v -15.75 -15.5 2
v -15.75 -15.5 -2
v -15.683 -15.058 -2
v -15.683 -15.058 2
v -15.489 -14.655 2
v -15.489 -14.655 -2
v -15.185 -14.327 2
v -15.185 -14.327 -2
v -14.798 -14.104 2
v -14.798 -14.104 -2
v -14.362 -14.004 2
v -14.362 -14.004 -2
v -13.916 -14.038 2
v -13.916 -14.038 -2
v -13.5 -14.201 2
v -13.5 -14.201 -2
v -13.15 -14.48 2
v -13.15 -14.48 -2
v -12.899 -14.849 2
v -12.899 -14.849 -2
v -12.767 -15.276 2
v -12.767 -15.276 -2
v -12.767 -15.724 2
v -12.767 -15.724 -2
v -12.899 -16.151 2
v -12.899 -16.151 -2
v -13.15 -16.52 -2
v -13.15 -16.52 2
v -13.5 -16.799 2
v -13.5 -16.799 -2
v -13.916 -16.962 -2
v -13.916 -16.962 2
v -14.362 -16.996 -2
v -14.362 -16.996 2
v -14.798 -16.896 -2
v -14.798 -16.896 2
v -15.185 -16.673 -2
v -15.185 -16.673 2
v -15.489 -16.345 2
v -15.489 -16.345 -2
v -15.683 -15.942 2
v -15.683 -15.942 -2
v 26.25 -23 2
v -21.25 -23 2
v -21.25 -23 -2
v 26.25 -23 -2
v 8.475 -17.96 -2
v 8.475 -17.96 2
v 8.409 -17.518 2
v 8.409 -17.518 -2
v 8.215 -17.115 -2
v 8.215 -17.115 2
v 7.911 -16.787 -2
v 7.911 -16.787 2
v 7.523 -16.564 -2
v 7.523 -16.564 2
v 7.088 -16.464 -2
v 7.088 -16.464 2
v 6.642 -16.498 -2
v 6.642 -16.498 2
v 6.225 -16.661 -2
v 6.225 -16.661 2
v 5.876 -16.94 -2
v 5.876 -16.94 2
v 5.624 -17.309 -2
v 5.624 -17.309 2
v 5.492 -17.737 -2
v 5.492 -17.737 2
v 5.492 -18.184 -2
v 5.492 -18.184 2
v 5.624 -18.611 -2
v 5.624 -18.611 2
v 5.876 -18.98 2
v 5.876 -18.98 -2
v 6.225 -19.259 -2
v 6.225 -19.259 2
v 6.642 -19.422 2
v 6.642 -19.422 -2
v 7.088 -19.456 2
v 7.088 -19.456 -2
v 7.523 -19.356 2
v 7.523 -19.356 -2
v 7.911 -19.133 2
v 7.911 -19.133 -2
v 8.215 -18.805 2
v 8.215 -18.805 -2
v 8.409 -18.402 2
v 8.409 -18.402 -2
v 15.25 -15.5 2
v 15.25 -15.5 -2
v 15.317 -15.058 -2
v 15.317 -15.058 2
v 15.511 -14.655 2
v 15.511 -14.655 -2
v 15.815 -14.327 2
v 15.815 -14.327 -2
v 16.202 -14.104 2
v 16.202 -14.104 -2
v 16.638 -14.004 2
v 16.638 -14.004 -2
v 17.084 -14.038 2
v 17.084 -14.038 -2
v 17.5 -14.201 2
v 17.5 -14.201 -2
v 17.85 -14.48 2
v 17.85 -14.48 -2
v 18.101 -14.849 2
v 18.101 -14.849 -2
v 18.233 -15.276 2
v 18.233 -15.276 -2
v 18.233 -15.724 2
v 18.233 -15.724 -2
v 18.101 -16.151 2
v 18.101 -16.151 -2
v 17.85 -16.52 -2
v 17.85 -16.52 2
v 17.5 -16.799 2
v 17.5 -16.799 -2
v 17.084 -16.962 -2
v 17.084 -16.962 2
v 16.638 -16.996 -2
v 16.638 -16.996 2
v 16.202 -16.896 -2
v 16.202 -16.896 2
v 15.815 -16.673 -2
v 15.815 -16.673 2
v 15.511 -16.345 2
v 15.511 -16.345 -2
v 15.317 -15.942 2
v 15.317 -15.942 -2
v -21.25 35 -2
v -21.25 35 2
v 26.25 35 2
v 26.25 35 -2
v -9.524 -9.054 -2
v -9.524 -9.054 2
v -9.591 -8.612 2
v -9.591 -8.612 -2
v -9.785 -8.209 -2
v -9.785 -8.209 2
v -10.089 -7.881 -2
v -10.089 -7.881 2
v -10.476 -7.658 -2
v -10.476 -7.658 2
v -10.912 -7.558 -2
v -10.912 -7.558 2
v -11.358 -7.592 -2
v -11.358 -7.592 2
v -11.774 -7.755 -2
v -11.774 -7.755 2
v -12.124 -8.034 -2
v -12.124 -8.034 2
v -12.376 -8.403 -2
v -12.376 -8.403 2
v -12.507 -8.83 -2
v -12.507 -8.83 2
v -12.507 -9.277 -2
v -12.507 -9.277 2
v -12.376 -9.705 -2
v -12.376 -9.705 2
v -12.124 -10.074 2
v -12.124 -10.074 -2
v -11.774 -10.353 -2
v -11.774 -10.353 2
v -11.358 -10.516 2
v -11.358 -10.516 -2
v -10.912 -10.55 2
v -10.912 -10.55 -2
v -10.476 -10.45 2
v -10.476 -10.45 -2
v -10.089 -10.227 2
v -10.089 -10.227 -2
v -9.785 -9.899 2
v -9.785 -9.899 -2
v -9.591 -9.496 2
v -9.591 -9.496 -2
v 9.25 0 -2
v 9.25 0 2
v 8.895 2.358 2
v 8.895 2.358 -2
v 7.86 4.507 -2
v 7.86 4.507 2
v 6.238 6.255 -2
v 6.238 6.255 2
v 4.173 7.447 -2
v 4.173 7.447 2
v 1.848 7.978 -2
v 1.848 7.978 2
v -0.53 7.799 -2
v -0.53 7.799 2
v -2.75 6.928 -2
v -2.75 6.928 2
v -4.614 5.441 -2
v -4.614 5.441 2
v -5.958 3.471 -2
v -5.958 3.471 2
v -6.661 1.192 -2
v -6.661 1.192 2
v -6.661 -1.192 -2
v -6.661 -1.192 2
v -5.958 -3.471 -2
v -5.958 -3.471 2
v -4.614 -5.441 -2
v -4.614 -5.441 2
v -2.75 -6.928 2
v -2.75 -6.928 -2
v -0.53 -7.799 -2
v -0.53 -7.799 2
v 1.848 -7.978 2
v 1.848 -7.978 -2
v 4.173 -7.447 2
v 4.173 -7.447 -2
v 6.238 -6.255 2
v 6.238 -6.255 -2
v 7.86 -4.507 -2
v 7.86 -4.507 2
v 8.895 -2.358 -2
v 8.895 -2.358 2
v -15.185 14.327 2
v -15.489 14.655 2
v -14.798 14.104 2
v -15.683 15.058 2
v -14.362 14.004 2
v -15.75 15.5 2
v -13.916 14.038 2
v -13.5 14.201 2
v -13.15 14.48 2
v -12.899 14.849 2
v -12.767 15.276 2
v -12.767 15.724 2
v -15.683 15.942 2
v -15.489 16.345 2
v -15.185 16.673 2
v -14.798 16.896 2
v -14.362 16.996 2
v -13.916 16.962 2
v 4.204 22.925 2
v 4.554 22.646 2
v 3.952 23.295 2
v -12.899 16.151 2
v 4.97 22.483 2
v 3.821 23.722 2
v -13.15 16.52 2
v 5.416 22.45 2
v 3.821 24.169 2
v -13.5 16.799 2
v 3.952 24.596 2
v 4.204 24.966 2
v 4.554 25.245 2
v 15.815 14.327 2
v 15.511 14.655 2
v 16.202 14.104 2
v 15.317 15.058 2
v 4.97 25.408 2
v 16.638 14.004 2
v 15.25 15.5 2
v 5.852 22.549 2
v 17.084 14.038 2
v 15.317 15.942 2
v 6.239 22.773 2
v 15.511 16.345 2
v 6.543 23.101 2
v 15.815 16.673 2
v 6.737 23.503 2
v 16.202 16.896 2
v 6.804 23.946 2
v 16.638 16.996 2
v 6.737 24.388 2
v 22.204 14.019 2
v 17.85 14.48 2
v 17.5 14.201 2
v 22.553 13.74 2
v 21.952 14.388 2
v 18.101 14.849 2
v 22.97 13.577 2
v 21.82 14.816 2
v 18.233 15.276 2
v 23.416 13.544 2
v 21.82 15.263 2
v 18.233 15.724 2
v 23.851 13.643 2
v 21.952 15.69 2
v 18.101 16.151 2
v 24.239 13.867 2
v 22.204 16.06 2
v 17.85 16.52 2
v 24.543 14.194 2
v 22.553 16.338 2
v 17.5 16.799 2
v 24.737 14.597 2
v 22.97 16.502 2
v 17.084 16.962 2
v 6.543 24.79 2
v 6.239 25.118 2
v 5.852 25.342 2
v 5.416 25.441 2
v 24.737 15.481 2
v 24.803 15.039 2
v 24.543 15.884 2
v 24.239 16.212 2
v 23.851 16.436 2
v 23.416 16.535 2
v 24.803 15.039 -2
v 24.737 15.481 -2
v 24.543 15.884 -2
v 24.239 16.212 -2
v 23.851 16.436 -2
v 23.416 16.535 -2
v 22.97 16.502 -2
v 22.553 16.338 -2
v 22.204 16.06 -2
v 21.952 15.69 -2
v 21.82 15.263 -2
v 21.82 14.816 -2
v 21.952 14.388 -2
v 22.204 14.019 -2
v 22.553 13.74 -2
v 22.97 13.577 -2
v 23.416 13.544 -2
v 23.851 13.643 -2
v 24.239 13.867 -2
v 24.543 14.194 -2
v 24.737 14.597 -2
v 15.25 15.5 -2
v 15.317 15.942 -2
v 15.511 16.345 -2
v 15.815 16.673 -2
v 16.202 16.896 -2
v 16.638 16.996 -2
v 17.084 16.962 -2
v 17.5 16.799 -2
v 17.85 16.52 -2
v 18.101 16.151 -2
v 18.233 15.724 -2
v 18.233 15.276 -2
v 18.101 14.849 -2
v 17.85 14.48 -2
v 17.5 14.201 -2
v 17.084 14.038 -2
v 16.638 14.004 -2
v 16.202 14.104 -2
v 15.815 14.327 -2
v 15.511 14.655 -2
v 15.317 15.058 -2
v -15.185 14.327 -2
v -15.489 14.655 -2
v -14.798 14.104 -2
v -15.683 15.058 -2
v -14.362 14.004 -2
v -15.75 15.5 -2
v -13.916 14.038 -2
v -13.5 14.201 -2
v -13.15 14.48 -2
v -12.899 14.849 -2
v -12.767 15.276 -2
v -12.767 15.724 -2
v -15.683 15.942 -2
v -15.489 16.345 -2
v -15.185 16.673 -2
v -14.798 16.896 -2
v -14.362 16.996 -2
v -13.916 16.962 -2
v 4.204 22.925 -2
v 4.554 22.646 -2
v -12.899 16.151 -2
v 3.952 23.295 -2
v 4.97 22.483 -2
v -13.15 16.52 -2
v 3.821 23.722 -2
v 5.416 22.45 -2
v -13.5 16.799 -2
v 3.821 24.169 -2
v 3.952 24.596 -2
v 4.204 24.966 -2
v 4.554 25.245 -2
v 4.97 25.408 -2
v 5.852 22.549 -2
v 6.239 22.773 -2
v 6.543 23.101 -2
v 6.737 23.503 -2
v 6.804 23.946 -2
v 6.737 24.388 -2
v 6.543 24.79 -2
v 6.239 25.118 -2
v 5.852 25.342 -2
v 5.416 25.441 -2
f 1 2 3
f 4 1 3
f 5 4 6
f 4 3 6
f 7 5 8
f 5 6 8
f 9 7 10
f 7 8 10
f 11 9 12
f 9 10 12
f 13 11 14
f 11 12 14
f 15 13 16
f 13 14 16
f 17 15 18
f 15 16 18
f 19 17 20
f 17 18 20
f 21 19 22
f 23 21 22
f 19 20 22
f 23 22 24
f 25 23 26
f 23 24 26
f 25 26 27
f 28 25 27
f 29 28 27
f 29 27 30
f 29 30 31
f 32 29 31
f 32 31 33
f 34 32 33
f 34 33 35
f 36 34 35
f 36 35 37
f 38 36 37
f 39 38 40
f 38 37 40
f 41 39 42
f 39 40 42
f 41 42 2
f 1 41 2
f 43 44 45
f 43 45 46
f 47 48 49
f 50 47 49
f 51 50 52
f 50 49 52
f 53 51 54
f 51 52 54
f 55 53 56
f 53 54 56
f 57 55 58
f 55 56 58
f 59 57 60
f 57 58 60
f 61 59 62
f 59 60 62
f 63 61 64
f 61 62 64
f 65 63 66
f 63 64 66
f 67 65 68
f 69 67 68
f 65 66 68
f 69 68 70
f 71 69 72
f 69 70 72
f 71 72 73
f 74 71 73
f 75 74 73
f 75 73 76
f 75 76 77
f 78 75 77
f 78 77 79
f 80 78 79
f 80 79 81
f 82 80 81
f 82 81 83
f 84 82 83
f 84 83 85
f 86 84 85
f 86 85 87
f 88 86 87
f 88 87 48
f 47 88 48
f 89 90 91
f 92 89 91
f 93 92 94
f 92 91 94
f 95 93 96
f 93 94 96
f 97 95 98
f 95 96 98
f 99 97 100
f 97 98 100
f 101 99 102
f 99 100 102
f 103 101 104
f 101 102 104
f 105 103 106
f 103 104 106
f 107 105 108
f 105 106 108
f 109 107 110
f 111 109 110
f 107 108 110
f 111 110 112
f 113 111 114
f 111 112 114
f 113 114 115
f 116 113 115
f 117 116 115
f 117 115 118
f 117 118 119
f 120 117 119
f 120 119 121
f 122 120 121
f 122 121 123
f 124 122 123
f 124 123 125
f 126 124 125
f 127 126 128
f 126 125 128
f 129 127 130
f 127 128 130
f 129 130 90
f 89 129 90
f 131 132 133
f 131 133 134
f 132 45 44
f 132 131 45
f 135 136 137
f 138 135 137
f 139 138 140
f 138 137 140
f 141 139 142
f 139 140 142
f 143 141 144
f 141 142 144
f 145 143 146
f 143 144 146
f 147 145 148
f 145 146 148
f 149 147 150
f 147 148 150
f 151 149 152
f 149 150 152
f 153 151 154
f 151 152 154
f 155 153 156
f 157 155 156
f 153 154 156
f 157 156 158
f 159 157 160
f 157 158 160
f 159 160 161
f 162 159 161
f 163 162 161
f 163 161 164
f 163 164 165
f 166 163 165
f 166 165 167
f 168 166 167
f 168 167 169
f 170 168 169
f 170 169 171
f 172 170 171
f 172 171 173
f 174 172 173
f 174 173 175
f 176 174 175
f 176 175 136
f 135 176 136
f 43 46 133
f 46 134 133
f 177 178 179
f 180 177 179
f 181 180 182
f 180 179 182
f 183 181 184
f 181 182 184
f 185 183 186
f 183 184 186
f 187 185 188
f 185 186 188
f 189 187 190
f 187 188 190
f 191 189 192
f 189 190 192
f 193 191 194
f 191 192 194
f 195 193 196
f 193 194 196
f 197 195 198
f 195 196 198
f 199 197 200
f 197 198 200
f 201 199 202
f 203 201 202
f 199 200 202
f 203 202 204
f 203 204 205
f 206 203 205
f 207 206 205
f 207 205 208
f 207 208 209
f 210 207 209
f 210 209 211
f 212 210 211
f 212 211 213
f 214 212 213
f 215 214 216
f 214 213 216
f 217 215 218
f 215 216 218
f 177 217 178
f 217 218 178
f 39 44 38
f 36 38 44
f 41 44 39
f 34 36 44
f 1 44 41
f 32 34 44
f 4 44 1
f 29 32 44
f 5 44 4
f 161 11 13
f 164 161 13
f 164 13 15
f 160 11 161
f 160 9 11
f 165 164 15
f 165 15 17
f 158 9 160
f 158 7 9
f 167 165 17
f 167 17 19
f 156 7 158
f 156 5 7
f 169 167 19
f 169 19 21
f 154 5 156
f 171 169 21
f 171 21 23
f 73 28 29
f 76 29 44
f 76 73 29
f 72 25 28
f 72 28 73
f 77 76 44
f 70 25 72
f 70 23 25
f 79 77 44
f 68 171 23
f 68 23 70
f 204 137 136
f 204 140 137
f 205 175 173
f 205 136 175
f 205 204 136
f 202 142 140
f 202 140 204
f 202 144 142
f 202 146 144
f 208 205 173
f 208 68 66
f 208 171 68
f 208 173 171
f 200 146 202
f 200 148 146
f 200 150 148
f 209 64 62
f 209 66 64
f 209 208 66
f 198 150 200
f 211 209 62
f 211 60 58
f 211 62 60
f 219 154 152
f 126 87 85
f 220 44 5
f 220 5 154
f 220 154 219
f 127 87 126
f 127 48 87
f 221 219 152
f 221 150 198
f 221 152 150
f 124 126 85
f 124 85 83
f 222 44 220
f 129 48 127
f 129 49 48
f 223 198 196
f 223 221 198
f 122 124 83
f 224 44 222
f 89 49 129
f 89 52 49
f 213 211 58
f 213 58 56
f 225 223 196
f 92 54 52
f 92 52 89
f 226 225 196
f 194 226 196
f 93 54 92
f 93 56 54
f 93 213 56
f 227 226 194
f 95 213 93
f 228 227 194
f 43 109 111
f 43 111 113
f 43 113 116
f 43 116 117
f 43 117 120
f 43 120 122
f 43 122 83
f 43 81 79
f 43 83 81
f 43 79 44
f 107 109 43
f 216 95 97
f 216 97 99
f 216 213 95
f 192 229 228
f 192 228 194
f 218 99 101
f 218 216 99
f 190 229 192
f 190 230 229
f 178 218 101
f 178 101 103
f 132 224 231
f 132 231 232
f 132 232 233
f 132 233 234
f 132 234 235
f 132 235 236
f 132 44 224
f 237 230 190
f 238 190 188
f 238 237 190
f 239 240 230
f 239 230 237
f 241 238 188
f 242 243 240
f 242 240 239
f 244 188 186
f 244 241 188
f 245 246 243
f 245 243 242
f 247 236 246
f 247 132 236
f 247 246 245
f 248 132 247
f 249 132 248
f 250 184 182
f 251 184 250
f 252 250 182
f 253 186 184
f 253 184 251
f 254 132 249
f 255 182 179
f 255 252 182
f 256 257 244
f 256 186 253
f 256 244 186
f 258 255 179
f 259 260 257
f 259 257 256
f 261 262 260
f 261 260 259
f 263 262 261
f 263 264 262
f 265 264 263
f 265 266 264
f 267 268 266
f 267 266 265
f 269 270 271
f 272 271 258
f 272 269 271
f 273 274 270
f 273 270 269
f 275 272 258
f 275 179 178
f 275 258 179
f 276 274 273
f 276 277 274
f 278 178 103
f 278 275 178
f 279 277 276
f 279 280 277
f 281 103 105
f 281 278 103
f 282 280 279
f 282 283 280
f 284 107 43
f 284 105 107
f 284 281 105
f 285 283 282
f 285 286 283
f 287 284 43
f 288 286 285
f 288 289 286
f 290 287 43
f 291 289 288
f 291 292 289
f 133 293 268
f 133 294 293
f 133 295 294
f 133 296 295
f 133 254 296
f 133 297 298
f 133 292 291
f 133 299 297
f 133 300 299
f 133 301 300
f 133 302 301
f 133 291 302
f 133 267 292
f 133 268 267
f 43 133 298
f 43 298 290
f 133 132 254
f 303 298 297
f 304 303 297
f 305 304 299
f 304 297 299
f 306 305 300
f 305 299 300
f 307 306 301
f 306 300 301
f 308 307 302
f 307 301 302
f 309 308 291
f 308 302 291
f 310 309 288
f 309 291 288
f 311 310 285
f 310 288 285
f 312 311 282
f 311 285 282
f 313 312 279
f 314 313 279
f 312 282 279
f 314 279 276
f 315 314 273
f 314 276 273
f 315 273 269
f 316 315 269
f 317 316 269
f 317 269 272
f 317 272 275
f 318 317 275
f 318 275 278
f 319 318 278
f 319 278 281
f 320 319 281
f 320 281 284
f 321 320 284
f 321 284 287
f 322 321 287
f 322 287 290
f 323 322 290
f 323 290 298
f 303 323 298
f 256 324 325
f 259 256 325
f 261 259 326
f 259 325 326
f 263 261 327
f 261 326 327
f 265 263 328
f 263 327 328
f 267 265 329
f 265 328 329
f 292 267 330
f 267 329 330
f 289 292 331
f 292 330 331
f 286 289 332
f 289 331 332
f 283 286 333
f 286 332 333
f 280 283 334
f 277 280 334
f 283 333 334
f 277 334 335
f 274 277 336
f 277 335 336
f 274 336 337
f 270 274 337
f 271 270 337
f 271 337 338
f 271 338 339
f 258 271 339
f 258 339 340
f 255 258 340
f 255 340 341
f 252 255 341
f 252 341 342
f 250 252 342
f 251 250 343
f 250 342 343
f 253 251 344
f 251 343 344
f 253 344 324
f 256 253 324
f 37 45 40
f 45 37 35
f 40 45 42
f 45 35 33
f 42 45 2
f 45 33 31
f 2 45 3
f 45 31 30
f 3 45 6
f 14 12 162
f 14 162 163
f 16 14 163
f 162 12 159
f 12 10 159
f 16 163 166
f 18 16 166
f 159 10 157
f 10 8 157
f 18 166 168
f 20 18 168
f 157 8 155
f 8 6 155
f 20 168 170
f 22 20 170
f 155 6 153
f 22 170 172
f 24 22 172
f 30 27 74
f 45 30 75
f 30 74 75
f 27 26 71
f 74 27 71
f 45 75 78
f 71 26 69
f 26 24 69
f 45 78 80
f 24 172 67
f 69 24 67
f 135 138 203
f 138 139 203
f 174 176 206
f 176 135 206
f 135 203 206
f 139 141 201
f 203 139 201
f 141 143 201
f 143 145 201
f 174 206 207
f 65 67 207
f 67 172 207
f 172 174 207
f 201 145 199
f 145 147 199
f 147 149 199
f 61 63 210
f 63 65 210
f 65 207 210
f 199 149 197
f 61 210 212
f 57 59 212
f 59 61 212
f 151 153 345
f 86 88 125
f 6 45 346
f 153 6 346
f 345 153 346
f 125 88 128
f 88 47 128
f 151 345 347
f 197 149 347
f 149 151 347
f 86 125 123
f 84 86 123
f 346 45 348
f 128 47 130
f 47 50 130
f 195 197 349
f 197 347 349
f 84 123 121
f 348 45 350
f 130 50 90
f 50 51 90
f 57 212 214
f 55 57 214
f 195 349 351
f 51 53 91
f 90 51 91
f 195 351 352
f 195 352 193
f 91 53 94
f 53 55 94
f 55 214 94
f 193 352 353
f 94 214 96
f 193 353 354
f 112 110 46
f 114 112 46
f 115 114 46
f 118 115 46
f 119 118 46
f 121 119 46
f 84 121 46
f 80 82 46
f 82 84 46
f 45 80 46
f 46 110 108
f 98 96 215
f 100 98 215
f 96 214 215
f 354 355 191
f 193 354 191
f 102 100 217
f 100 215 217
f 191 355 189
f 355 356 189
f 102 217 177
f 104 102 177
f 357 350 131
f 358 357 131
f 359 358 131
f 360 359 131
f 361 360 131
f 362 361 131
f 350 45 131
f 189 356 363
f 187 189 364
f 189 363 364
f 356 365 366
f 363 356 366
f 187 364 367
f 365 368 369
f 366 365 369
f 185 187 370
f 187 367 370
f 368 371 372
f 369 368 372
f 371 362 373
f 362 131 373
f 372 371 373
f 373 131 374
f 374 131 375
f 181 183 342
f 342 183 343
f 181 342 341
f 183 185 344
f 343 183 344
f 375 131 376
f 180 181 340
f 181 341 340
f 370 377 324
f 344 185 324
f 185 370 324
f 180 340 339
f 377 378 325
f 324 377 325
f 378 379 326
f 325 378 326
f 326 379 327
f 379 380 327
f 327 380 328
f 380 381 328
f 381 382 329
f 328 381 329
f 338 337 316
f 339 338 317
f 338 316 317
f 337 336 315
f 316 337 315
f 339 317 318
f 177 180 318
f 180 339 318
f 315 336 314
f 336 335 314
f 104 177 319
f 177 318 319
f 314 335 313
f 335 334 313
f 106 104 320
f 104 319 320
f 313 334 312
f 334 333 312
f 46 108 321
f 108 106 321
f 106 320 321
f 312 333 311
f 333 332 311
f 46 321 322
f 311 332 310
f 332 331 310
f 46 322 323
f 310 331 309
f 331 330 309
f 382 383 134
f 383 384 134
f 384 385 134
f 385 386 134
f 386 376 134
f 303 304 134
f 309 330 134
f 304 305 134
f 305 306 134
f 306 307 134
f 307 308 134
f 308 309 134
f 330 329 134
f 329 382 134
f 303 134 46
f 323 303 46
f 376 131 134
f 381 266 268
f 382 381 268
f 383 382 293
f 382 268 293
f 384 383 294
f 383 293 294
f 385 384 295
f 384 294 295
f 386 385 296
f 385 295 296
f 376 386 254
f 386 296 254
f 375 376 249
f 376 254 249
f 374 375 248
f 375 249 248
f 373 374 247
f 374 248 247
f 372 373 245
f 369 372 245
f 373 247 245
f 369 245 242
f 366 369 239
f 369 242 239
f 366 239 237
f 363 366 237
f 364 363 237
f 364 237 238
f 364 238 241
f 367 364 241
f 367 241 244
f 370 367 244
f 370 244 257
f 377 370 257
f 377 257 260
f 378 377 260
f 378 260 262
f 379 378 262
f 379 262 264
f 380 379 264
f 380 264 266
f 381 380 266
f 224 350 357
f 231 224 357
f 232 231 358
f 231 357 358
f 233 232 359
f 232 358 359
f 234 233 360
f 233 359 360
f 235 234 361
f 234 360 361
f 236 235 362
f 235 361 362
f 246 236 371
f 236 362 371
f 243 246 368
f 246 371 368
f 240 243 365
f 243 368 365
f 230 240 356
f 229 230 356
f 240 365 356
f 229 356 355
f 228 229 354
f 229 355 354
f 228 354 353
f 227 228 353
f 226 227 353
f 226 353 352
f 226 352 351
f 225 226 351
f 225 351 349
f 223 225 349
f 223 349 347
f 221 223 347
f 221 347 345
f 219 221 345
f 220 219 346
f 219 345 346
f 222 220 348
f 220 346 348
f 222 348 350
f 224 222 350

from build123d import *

# Parameters (mm, degrees)
SKETCH1_W           = 42.5
SKETCH1_H           = 40
BOSS_EXTRUDE1_DEPTH = 2
SKETCH2_R           = 1.5
CUT_EXTRUDE1_DEPTH  = 4
SKETCH3_R           = 8
CUT_EXTRUDE2_DEPTH  = 4
SKETCH4_W           = 42.5
SKETCH4_H           = 4
BOSS_EXTRUDE2_DEPTH = 15
SKETCH8_W           = 4
SKETCH8_H           = 55
BOSS_EXTRUDE3_DEPTH = 5
SKETCH7_R           = 1.5
CUT_EXTRUDE3_DEPTH  = 10
SKETCH9_W           = 47.5
SKETCH9_H           = 4
BOSS_EXTRUDE4_DEPTH = 3


with BuildPart() as part:
    # Sketch1 → Boss-Extrude1 (new, symmetric)
    with BuildSketch(Plane.XY):
        Rectangle(SKETCH1_W, SKETCH1_H)
    extrude(amount=BOSS_EXTRUDE1_DEPTH, both=True)

    # Sketch2 → Cut-Extrude1 (cut)
    with BuildSketch(Plane(origin=(0, 0, -2), x_dir=(-1, 0, 0), z_dir=(0, 0, -1))):
        with Locations((-16.75, 15.5)):
            Circle(SKETCH2_R)
        with Locations((14.25, 15.5)):
            Circle(SKETCH2_R)
        with Locations((14.25, -15.5)):
            Circle(SKETCH2_R)
        with Locations((-16.75, -15.5)):
            Circle(SKETCH2_R)
    extrude(amount=-CUT_EXTRUDE1_DEPTH, mode=Mode.SUBTRACT)

    # Sketch3 → Cut-Extrude2 (cut)
    with BuildSketch(Plane.XY.offset(2)):
        with Locations((1.25, 0)):
            Circle(SKETCH3_R)
    extrude(amount=-CUT_EXTRUDE2_DEPTH, mode=Mode.SUBTRACT)

    # Sketch4 → Boss-Extrude2 (add)
    with BuildSketch(Plane(origin=(0, 20, 0), x_dir=(1, 0, 0), z_dir=(0, 1, 0))):
        Rectangle(SKETCH4_W, SKETCH4_H)
    extrude(amount=BOSS_EXTRUDE2_DEPTH)

    # Sketch8 → Boss-Extrude3 (add)
    with BuildSketch(Plane(origin=(21.25, 0, 0), x_dir=(0, 0, -1), z_dir=(1, 0, 0))):
        with Locations((0, 7.5)):
            Rectangle(SKETCH8_W, SKETCH8_H)
    extrude(amount=BOSS_EXTRUDE3_DEPTH)

    # Sketch7 → Cut-Extrude3 (cut)
    with BuildSketch(Plane.XY.offset(2)):
        with Locations((5.303802982, 23.945501151)):
            Circle(SKETCH7_R)
        with Locations((23.303478189, 15.039308246)):
            Circle(SKETCH7_R)
        with Locations((6.975457864, -17.9600963)):
            Circle(SKETCH7_R)
        with Locations((-11.024217343, -9.053903396)):
            Circle(SKETCH7_R)
    extrude(amount=-CUT_EXTRUDE3_DEPTH, mode=Mode.SUBTRACT)

    # Sketch9 → Boss-Extrude4 (add)
    with BuildSketch(Plane.XZ.offset(20)):
        with Locations((2.5, 0)):
            Rectangle(SKETCH9_W, SKETCH9_H)
    extrude(amount=BOSS_EXTRUDE4_DEPTH)


solid = part.part
